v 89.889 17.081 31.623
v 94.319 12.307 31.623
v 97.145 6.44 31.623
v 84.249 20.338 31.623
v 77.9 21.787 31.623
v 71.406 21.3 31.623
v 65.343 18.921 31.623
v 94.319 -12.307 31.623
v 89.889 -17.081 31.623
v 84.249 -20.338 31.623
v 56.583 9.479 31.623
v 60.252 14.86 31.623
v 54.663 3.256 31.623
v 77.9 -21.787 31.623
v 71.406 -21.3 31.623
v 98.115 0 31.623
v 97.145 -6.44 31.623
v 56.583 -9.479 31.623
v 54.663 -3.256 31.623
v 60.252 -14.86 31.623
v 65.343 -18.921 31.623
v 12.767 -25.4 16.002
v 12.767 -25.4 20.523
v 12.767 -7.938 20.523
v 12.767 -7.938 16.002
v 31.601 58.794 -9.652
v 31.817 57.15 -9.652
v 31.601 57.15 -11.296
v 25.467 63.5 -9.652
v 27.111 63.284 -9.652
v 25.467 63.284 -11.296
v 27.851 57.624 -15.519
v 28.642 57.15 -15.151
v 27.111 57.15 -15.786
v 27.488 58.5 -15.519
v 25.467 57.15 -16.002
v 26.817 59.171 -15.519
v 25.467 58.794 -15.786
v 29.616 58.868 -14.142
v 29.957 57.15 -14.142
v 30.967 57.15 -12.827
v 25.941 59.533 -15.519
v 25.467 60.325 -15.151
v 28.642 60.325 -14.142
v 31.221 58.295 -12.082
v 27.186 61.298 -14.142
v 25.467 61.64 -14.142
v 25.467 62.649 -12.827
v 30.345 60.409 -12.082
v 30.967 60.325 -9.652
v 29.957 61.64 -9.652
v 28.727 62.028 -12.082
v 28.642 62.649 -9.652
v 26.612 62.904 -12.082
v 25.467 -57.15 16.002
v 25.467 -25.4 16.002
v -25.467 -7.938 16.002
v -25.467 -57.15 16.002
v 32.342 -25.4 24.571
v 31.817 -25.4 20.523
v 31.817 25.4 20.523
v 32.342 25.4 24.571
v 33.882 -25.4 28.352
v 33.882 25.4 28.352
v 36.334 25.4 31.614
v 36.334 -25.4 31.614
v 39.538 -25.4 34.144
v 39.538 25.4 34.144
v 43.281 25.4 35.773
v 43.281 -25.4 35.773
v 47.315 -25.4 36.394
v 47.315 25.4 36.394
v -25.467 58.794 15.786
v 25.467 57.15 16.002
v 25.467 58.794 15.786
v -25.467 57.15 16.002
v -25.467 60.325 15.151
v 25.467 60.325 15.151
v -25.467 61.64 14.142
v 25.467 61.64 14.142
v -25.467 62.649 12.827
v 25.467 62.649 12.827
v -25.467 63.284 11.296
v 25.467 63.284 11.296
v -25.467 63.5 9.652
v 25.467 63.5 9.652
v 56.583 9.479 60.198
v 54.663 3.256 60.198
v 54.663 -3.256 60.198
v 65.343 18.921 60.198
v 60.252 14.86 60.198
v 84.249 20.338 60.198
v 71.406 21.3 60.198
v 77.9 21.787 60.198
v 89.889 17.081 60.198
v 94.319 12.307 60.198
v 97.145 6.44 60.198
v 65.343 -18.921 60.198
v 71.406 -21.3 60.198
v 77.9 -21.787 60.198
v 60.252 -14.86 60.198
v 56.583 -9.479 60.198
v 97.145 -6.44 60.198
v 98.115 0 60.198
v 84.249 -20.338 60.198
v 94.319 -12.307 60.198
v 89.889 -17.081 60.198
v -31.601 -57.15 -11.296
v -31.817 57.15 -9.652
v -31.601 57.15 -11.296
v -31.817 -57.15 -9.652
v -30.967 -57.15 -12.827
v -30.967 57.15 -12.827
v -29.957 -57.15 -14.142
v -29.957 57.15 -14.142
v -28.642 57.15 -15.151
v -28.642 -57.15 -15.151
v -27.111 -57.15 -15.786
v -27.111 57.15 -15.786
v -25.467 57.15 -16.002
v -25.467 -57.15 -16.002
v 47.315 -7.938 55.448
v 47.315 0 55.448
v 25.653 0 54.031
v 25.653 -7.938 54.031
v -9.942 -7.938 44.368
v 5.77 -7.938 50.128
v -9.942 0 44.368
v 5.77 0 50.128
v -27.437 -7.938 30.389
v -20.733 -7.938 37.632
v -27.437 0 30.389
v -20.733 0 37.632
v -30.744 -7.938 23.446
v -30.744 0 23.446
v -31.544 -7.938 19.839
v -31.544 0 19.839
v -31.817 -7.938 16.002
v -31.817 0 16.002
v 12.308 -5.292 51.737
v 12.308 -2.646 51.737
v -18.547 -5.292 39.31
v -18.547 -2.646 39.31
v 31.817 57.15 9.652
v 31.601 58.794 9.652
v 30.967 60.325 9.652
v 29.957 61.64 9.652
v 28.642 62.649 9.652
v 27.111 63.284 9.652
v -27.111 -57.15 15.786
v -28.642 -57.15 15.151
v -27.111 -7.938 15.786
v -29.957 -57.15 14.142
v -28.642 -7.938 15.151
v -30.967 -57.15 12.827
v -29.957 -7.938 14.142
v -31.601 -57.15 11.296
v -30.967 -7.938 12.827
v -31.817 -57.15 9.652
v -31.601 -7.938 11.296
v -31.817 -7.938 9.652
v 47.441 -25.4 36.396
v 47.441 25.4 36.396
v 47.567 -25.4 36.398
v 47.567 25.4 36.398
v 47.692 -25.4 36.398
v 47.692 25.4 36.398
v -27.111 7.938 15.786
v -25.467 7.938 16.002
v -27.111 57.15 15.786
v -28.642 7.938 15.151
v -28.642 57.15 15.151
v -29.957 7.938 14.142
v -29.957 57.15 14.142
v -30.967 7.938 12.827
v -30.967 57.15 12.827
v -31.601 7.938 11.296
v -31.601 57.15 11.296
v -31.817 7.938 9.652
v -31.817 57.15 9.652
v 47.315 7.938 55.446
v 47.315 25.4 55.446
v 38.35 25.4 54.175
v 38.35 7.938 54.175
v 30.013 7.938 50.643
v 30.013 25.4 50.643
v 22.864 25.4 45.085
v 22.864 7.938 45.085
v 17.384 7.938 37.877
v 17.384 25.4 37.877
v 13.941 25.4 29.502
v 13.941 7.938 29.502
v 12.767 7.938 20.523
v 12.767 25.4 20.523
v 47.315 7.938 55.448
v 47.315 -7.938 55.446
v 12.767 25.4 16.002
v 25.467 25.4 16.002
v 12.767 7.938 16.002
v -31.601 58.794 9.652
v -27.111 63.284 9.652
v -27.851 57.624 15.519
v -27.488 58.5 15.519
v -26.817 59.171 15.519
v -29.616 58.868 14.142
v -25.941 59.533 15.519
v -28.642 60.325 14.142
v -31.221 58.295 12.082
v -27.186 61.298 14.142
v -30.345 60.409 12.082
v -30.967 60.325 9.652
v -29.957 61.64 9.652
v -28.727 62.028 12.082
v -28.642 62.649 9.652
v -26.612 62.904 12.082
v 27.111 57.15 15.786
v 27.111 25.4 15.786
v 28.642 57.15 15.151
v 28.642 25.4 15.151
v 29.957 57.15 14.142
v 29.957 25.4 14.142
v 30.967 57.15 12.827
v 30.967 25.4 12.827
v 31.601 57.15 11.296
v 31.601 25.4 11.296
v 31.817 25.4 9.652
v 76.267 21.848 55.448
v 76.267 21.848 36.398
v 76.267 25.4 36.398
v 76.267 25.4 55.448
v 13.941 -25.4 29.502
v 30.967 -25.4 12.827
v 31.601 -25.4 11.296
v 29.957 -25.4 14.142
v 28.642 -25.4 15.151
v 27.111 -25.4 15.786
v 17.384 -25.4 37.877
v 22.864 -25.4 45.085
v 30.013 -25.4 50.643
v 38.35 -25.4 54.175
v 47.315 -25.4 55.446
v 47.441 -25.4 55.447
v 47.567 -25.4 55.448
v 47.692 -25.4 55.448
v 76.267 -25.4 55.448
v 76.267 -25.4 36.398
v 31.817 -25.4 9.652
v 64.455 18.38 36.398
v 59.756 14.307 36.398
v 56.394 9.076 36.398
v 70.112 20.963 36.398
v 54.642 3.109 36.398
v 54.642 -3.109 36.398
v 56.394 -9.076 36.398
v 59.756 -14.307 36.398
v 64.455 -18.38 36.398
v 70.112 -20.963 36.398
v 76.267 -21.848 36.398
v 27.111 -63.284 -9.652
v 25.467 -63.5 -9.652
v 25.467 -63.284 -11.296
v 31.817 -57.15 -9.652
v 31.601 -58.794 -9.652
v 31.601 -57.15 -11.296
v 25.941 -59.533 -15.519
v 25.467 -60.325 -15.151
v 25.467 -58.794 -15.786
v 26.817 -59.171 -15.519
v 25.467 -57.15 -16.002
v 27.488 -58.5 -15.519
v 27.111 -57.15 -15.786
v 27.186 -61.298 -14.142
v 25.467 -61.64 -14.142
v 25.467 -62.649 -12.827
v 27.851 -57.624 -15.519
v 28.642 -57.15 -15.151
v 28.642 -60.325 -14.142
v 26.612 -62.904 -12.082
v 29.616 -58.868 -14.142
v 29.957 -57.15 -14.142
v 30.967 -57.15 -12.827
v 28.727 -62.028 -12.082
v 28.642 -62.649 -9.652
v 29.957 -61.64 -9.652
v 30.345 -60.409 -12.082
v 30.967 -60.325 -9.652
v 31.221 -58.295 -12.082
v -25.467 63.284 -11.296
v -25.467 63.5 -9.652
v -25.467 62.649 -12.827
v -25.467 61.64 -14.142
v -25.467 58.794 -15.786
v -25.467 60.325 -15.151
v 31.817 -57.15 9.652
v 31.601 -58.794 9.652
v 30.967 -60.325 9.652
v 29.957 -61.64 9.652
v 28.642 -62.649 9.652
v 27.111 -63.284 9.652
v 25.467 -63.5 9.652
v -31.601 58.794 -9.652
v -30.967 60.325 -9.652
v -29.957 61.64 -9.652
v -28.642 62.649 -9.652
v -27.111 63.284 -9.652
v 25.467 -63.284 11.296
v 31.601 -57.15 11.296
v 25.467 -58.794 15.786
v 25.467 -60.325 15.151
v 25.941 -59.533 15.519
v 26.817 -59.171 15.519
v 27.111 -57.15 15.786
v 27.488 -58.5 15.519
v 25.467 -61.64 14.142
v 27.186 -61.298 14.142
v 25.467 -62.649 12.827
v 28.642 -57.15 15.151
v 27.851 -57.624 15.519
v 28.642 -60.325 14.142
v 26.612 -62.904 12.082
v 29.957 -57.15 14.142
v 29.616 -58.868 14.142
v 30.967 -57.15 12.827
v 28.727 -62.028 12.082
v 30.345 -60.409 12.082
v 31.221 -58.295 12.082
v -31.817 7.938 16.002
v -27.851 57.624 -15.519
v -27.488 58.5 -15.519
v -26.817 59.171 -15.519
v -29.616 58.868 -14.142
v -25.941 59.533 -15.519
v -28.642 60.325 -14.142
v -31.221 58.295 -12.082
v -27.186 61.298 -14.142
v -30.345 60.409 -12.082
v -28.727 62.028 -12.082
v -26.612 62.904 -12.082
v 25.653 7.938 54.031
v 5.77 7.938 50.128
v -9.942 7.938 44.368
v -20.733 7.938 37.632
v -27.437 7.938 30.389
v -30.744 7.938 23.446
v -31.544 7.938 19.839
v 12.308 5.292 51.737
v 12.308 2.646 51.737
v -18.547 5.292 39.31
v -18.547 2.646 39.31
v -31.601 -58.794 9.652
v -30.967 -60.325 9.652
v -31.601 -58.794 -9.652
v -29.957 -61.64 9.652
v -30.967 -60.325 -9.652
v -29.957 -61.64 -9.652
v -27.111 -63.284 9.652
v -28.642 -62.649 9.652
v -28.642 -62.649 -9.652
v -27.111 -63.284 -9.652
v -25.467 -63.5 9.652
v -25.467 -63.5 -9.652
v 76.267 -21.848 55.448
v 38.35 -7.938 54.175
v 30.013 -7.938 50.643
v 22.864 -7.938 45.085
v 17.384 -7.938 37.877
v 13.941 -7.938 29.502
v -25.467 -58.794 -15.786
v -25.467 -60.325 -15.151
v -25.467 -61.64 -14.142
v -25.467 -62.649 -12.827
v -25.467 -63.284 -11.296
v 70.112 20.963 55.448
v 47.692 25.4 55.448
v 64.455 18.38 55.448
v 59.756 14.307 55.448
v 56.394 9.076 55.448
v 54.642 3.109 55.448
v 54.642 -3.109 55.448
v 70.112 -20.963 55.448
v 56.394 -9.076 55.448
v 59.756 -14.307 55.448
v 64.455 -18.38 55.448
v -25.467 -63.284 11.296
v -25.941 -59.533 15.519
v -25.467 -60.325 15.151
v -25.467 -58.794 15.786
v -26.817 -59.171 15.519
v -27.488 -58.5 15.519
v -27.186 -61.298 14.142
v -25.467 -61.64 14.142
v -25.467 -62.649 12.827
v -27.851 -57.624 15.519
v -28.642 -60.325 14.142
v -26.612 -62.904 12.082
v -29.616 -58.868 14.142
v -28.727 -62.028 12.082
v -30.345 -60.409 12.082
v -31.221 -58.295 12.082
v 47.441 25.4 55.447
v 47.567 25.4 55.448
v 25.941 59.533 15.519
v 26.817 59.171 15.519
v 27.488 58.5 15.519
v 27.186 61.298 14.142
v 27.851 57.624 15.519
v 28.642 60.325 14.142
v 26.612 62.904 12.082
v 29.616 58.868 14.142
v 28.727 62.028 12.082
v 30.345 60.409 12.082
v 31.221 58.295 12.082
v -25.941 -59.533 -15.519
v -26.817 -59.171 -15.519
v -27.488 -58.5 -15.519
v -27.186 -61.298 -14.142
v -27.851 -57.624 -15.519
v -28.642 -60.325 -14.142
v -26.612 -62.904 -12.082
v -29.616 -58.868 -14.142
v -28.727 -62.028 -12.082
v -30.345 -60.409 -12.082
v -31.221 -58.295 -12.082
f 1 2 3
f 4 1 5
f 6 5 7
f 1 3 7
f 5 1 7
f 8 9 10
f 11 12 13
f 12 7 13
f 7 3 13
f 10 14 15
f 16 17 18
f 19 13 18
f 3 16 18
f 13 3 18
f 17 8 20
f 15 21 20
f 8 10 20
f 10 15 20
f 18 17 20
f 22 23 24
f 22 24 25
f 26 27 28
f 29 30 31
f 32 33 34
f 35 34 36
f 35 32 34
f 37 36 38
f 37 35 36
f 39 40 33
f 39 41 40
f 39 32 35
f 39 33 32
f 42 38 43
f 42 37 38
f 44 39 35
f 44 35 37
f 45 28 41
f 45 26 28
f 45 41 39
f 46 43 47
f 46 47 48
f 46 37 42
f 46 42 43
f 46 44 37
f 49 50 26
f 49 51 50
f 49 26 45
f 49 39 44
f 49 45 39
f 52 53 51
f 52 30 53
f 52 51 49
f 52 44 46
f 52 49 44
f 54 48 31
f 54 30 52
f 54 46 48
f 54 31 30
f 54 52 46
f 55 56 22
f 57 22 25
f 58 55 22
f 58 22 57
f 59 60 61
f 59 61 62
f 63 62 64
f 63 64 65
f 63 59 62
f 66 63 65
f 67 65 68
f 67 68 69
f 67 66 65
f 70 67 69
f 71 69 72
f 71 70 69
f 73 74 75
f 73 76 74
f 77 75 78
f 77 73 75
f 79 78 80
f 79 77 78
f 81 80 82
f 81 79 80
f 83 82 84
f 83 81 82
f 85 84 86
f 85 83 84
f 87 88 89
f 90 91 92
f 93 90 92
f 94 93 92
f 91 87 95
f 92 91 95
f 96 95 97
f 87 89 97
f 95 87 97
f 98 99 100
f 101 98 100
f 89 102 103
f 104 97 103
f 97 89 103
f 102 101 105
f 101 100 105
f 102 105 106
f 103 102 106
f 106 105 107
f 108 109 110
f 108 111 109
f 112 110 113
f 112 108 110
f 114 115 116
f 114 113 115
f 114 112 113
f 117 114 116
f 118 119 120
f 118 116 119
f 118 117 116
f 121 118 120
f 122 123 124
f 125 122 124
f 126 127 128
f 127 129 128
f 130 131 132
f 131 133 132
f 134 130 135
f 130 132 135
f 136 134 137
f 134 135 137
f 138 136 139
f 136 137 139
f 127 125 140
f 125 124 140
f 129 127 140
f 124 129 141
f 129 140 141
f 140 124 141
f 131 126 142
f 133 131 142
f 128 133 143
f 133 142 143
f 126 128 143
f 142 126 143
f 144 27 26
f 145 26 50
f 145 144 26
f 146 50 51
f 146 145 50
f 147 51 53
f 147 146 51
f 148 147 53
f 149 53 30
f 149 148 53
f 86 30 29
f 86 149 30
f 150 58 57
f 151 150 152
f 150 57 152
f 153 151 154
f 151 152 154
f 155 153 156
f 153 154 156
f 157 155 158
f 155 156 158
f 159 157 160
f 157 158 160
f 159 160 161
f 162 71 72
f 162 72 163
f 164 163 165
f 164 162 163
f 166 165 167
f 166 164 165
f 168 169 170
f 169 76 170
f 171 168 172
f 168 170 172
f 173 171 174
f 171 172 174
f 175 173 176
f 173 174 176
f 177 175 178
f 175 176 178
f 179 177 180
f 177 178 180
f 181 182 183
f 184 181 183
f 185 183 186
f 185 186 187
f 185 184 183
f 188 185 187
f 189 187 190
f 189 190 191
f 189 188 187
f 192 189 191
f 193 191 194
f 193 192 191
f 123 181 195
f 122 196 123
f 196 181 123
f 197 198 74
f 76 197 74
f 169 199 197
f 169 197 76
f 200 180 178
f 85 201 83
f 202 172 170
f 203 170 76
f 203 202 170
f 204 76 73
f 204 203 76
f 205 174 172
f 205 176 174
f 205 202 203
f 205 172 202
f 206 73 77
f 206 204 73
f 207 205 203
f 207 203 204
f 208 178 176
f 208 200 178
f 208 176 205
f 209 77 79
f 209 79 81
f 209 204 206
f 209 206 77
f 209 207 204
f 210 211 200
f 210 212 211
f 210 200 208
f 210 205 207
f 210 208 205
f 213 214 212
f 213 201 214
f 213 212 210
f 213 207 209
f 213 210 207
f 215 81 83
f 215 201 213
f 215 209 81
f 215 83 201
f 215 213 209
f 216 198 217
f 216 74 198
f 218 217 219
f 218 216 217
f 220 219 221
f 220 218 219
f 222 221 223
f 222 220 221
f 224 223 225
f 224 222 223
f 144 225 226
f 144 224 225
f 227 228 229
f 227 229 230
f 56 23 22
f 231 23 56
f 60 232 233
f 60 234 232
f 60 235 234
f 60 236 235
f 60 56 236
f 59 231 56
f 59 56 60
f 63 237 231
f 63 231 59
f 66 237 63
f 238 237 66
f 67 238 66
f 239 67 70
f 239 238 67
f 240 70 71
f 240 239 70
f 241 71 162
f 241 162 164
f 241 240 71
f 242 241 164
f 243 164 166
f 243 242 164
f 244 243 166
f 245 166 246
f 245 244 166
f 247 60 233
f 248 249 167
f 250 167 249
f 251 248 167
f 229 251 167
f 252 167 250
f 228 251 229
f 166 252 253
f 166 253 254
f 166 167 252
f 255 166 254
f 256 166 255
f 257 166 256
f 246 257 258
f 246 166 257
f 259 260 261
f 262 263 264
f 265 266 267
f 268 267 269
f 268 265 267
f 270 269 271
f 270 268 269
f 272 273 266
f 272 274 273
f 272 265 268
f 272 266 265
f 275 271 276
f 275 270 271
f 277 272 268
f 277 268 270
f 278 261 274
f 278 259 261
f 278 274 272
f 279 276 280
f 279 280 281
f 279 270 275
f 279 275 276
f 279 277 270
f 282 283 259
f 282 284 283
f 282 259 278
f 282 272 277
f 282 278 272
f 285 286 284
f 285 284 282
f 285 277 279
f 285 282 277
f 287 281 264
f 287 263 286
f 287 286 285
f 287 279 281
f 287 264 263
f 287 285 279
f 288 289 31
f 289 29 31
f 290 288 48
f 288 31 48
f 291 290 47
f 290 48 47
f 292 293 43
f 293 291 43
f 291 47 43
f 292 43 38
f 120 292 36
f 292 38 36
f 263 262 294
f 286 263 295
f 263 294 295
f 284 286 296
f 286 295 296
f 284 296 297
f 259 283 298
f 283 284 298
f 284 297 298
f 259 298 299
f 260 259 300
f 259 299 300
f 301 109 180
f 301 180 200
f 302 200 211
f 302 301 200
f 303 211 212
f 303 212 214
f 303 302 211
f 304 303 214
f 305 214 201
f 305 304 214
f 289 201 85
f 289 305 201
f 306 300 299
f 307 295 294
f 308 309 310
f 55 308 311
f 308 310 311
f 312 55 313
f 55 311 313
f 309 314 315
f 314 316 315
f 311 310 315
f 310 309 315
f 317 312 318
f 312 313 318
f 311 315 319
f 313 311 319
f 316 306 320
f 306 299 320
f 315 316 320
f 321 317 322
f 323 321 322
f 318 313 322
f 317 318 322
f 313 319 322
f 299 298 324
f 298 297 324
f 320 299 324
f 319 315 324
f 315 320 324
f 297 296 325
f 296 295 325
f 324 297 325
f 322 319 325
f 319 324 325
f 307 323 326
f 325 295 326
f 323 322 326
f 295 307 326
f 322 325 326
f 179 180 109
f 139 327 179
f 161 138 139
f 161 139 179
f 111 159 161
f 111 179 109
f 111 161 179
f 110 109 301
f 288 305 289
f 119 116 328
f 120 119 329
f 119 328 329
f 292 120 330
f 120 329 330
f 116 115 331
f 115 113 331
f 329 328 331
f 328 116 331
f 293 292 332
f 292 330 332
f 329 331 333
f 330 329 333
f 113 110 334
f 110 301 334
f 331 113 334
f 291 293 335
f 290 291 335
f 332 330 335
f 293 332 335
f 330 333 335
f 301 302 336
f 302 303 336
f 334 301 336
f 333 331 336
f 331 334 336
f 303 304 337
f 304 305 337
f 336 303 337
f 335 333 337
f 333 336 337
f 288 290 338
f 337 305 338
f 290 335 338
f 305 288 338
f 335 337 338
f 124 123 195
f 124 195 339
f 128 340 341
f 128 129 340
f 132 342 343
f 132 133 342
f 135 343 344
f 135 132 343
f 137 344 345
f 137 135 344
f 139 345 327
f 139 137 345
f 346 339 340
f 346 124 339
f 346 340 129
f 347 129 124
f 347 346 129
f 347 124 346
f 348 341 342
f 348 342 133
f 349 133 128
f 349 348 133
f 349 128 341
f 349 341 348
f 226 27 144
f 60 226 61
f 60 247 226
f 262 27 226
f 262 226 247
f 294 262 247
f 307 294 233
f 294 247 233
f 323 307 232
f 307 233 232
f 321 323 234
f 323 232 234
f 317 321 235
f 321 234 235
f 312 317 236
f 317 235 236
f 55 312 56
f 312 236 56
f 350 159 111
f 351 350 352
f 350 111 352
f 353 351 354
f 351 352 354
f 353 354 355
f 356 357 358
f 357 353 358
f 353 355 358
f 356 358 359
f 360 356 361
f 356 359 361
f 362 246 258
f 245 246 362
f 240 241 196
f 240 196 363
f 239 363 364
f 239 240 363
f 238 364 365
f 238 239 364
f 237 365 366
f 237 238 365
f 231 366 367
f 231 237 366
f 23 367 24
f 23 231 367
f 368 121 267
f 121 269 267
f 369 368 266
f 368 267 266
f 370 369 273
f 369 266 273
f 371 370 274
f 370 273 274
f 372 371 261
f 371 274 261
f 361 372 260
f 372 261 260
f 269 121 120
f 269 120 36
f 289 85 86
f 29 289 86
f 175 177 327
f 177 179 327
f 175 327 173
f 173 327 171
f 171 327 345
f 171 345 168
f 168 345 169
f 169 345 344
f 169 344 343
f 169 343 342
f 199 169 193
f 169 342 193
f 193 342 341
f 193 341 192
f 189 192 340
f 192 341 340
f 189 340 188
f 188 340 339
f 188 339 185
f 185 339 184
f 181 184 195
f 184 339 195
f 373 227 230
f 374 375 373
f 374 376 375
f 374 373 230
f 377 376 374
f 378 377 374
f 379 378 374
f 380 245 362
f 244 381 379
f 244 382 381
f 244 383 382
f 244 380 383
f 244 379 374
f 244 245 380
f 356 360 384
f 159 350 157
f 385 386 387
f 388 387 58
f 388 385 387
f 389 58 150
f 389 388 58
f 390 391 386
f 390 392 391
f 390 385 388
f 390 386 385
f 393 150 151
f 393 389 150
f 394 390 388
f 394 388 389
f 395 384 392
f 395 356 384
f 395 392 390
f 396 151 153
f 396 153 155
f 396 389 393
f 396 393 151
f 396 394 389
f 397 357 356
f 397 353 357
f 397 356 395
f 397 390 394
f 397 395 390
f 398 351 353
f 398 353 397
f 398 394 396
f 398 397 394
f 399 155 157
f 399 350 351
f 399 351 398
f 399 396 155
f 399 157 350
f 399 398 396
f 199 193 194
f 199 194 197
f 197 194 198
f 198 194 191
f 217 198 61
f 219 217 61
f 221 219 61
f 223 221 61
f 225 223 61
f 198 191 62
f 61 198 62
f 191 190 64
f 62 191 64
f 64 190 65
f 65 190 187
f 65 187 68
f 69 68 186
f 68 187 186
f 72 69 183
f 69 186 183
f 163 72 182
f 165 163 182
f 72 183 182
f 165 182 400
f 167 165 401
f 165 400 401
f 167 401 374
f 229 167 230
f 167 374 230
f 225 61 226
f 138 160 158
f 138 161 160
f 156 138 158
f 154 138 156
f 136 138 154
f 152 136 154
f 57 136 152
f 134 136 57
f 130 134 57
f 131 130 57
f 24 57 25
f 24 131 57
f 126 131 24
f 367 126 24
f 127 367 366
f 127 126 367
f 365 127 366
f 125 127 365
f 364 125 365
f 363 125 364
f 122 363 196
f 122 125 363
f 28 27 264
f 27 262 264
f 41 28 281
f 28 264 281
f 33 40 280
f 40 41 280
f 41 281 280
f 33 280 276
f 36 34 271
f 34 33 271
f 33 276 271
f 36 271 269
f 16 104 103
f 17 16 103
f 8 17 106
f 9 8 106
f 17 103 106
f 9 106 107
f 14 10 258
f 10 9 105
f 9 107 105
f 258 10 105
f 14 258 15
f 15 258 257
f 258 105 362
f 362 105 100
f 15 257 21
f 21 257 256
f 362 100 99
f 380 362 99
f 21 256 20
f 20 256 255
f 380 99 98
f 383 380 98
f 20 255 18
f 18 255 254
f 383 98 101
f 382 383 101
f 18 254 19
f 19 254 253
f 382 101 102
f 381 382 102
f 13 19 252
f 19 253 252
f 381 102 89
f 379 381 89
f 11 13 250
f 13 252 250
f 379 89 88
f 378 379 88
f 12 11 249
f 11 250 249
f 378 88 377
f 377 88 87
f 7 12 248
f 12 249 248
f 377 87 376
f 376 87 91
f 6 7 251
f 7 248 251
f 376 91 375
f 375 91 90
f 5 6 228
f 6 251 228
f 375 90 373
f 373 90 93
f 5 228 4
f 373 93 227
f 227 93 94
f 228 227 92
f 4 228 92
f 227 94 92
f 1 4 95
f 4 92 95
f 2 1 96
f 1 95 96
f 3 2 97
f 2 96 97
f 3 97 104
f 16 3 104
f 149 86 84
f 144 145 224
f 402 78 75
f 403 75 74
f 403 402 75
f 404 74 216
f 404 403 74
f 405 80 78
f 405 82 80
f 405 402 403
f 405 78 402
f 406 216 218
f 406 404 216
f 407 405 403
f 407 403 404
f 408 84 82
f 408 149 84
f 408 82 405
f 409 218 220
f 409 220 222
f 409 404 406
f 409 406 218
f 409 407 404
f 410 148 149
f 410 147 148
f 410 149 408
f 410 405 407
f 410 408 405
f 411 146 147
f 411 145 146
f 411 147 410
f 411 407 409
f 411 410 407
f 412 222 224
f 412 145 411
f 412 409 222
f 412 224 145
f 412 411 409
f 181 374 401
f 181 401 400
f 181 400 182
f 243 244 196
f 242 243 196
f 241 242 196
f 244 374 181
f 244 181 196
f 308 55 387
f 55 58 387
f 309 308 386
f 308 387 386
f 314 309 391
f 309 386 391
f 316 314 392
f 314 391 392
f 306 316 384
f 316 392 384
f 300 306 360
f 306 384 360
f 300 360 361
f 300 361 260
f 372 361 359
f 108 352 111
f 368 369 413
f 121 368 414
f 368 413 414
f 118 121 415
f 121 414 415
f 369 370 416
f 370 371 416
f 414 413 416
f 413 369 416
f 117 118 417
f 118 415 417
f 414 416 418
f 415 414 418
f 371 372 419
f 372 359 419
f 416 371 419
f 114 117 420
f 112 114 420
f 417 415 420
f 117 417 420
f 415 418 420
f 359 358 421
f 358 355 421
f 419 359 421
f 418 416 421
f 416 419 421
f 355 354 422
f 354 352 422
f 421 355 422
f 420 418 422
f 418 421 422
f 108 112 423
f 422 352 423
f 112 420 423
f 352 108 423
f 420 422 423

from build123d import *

# Parameters (mm, degrees)
F1_DEPTH = 63.5
F2_DEPTH = 25.4
F3_DEPTH = 7.9375
F5_R     = 6.35


with BuildPart() as f1:
    # F0 (on Front) → F1 (new body, symmetric)
    with BuildSketch(Plane.XZ):
        Polygon((12.7672983825, 16.0020012408), (-31.8172983825, 16.0020012408), (-31.8172983825, -16.0020012408), (31.8172983825, -16.0020012408), (31.8172983825, 16.0020012408), align=None)
    extrude(amount=F1_DEPTH, both=True)

    # F0 (on Front) → F2 (join, symmetric)
    with BuildSketch(Plane.XZ):
        with BuildLine():
            Line((12.7672983825, 20.5231987592), (12.7672983825, 16.0020012408))
            Line((12.7672983825, 16.0020012408), (31.8172983825, 16.0020012408))
            Line((31.8172983825, 16.0020012408), (31.8172983825, 20.5231987592))
            ThreePointArc((31.8172983825, 20.5231987592), (36.3344606658, 31.6144181421), (47.3152697086, 36.3937209427))
            Line((47.3152697086, 36.3937209427), (47.3152697086, 55.4461636158))
            ThreePointArc((47.3152697086, 55.4461636158), (22.8636521102, 45.0852416156), (12.7672983825, 20.5231987592))
        make_face()
        with BuildLine():
            ThreePointArc((47.6922983825, 55.4481987592), (47.5037812992, 55.4476899696), (47.3152697086, 55.4461636158))
            Line((47.3152697086, 55.4461636158), (47.3152697086, 36.3937209427))
            ThreePointArc((47.3152697086, 36.3937209427), (47.5037707507, 36.3970792656), (47.6922983825, 36.3981987592))
            Line((47.6922983825, 36.3981987592), (76.2672983825, 36.3981987592))
            Line((76.2672983825, 36.3981987592), (76.2672983825, 55.4481987592))
            Line((76.2672983825, 55.4481987592), (47.6922983825, 55.4481987592))
        make_face()
    extrude(amount=F2_DEPTH, both=True)

    # F0 (on Front) → F3 (join, symmetric)
    with BuildSketch(Plane.XZ):
        with BuildLine():
            add(Edge.make_bspline(
                [(47.3152697086, 55.447760652), (14.70907961, 55.3720610373), (-31.8172983825, 45.4738341579), (-31.8172983825, 16.0020012408)],
                knots=[0.3413515557, 0.3413515557, 0.3413515557, 0.3413515557, 88.7568503068, 88.7568503068, 88.7568503068, 88.7568503068], degree=3))
            Line((-31.8172983825, 16.0020012408), (12.7672983825, 16.0020012408))
            Line((12.7672983825, 16.0020012408), (12.7672983825, 20.5231987592))
            ThreePointArc((12.7672983825, 20.5231987592), (22.8636521102, 45.0852416156), (47.3152697086, 55.4461636158))
            Line((47.3152697086, 55.4461636158), (47.3152697086, 55.447760652))
        make_face()
    extrude(amount=F3_DEPTH, both=True)

    # F0 (on Front) → F4 (revolve)
    with BuildSketch(Plane.XZ):
        Polygon((98.1152697086, 60.1979987592), (76.2672983825, 60.1979987592), (76.2672983825, 55.4481987592), (76.2672983825, 36.3981987592), (76.2672983825, 31.6229987592), (98.1152697086, 31.6229987592), align=None)
    revolve(axis=Axis((76.2672983825, 0, 45.9104987592), (0, 0, -1)))

    # F5
    f5_edges = [f1.edges().sort_by_distance(p)[0] for p in [
        (31.817298, -63.5, 0),
        (-31.817298, -63.5, 0),
        (-31.817298, 63.5, 0),
        (31.817298, 63.5, 0),
        (0, -63.5, 16.002001),
        (0, -63.5, -16.002001),
        (31.817298, -44.45, 16.002001),
        (31.817298, 0, -16.002001),
        (-31.817298, 35.71875, 16.002001),
        (-31.817298, -35.71875, 16.002001),
        (-31.817298, 0, -16.002001),
        (0, 63.5, 16.002001),
        (0, 63.5, -16.002001),
        (31.817298, 44.45, 16.002001),
    ]]
    fillet(f5_edges, radius=F5_R)


solid = f1.part
